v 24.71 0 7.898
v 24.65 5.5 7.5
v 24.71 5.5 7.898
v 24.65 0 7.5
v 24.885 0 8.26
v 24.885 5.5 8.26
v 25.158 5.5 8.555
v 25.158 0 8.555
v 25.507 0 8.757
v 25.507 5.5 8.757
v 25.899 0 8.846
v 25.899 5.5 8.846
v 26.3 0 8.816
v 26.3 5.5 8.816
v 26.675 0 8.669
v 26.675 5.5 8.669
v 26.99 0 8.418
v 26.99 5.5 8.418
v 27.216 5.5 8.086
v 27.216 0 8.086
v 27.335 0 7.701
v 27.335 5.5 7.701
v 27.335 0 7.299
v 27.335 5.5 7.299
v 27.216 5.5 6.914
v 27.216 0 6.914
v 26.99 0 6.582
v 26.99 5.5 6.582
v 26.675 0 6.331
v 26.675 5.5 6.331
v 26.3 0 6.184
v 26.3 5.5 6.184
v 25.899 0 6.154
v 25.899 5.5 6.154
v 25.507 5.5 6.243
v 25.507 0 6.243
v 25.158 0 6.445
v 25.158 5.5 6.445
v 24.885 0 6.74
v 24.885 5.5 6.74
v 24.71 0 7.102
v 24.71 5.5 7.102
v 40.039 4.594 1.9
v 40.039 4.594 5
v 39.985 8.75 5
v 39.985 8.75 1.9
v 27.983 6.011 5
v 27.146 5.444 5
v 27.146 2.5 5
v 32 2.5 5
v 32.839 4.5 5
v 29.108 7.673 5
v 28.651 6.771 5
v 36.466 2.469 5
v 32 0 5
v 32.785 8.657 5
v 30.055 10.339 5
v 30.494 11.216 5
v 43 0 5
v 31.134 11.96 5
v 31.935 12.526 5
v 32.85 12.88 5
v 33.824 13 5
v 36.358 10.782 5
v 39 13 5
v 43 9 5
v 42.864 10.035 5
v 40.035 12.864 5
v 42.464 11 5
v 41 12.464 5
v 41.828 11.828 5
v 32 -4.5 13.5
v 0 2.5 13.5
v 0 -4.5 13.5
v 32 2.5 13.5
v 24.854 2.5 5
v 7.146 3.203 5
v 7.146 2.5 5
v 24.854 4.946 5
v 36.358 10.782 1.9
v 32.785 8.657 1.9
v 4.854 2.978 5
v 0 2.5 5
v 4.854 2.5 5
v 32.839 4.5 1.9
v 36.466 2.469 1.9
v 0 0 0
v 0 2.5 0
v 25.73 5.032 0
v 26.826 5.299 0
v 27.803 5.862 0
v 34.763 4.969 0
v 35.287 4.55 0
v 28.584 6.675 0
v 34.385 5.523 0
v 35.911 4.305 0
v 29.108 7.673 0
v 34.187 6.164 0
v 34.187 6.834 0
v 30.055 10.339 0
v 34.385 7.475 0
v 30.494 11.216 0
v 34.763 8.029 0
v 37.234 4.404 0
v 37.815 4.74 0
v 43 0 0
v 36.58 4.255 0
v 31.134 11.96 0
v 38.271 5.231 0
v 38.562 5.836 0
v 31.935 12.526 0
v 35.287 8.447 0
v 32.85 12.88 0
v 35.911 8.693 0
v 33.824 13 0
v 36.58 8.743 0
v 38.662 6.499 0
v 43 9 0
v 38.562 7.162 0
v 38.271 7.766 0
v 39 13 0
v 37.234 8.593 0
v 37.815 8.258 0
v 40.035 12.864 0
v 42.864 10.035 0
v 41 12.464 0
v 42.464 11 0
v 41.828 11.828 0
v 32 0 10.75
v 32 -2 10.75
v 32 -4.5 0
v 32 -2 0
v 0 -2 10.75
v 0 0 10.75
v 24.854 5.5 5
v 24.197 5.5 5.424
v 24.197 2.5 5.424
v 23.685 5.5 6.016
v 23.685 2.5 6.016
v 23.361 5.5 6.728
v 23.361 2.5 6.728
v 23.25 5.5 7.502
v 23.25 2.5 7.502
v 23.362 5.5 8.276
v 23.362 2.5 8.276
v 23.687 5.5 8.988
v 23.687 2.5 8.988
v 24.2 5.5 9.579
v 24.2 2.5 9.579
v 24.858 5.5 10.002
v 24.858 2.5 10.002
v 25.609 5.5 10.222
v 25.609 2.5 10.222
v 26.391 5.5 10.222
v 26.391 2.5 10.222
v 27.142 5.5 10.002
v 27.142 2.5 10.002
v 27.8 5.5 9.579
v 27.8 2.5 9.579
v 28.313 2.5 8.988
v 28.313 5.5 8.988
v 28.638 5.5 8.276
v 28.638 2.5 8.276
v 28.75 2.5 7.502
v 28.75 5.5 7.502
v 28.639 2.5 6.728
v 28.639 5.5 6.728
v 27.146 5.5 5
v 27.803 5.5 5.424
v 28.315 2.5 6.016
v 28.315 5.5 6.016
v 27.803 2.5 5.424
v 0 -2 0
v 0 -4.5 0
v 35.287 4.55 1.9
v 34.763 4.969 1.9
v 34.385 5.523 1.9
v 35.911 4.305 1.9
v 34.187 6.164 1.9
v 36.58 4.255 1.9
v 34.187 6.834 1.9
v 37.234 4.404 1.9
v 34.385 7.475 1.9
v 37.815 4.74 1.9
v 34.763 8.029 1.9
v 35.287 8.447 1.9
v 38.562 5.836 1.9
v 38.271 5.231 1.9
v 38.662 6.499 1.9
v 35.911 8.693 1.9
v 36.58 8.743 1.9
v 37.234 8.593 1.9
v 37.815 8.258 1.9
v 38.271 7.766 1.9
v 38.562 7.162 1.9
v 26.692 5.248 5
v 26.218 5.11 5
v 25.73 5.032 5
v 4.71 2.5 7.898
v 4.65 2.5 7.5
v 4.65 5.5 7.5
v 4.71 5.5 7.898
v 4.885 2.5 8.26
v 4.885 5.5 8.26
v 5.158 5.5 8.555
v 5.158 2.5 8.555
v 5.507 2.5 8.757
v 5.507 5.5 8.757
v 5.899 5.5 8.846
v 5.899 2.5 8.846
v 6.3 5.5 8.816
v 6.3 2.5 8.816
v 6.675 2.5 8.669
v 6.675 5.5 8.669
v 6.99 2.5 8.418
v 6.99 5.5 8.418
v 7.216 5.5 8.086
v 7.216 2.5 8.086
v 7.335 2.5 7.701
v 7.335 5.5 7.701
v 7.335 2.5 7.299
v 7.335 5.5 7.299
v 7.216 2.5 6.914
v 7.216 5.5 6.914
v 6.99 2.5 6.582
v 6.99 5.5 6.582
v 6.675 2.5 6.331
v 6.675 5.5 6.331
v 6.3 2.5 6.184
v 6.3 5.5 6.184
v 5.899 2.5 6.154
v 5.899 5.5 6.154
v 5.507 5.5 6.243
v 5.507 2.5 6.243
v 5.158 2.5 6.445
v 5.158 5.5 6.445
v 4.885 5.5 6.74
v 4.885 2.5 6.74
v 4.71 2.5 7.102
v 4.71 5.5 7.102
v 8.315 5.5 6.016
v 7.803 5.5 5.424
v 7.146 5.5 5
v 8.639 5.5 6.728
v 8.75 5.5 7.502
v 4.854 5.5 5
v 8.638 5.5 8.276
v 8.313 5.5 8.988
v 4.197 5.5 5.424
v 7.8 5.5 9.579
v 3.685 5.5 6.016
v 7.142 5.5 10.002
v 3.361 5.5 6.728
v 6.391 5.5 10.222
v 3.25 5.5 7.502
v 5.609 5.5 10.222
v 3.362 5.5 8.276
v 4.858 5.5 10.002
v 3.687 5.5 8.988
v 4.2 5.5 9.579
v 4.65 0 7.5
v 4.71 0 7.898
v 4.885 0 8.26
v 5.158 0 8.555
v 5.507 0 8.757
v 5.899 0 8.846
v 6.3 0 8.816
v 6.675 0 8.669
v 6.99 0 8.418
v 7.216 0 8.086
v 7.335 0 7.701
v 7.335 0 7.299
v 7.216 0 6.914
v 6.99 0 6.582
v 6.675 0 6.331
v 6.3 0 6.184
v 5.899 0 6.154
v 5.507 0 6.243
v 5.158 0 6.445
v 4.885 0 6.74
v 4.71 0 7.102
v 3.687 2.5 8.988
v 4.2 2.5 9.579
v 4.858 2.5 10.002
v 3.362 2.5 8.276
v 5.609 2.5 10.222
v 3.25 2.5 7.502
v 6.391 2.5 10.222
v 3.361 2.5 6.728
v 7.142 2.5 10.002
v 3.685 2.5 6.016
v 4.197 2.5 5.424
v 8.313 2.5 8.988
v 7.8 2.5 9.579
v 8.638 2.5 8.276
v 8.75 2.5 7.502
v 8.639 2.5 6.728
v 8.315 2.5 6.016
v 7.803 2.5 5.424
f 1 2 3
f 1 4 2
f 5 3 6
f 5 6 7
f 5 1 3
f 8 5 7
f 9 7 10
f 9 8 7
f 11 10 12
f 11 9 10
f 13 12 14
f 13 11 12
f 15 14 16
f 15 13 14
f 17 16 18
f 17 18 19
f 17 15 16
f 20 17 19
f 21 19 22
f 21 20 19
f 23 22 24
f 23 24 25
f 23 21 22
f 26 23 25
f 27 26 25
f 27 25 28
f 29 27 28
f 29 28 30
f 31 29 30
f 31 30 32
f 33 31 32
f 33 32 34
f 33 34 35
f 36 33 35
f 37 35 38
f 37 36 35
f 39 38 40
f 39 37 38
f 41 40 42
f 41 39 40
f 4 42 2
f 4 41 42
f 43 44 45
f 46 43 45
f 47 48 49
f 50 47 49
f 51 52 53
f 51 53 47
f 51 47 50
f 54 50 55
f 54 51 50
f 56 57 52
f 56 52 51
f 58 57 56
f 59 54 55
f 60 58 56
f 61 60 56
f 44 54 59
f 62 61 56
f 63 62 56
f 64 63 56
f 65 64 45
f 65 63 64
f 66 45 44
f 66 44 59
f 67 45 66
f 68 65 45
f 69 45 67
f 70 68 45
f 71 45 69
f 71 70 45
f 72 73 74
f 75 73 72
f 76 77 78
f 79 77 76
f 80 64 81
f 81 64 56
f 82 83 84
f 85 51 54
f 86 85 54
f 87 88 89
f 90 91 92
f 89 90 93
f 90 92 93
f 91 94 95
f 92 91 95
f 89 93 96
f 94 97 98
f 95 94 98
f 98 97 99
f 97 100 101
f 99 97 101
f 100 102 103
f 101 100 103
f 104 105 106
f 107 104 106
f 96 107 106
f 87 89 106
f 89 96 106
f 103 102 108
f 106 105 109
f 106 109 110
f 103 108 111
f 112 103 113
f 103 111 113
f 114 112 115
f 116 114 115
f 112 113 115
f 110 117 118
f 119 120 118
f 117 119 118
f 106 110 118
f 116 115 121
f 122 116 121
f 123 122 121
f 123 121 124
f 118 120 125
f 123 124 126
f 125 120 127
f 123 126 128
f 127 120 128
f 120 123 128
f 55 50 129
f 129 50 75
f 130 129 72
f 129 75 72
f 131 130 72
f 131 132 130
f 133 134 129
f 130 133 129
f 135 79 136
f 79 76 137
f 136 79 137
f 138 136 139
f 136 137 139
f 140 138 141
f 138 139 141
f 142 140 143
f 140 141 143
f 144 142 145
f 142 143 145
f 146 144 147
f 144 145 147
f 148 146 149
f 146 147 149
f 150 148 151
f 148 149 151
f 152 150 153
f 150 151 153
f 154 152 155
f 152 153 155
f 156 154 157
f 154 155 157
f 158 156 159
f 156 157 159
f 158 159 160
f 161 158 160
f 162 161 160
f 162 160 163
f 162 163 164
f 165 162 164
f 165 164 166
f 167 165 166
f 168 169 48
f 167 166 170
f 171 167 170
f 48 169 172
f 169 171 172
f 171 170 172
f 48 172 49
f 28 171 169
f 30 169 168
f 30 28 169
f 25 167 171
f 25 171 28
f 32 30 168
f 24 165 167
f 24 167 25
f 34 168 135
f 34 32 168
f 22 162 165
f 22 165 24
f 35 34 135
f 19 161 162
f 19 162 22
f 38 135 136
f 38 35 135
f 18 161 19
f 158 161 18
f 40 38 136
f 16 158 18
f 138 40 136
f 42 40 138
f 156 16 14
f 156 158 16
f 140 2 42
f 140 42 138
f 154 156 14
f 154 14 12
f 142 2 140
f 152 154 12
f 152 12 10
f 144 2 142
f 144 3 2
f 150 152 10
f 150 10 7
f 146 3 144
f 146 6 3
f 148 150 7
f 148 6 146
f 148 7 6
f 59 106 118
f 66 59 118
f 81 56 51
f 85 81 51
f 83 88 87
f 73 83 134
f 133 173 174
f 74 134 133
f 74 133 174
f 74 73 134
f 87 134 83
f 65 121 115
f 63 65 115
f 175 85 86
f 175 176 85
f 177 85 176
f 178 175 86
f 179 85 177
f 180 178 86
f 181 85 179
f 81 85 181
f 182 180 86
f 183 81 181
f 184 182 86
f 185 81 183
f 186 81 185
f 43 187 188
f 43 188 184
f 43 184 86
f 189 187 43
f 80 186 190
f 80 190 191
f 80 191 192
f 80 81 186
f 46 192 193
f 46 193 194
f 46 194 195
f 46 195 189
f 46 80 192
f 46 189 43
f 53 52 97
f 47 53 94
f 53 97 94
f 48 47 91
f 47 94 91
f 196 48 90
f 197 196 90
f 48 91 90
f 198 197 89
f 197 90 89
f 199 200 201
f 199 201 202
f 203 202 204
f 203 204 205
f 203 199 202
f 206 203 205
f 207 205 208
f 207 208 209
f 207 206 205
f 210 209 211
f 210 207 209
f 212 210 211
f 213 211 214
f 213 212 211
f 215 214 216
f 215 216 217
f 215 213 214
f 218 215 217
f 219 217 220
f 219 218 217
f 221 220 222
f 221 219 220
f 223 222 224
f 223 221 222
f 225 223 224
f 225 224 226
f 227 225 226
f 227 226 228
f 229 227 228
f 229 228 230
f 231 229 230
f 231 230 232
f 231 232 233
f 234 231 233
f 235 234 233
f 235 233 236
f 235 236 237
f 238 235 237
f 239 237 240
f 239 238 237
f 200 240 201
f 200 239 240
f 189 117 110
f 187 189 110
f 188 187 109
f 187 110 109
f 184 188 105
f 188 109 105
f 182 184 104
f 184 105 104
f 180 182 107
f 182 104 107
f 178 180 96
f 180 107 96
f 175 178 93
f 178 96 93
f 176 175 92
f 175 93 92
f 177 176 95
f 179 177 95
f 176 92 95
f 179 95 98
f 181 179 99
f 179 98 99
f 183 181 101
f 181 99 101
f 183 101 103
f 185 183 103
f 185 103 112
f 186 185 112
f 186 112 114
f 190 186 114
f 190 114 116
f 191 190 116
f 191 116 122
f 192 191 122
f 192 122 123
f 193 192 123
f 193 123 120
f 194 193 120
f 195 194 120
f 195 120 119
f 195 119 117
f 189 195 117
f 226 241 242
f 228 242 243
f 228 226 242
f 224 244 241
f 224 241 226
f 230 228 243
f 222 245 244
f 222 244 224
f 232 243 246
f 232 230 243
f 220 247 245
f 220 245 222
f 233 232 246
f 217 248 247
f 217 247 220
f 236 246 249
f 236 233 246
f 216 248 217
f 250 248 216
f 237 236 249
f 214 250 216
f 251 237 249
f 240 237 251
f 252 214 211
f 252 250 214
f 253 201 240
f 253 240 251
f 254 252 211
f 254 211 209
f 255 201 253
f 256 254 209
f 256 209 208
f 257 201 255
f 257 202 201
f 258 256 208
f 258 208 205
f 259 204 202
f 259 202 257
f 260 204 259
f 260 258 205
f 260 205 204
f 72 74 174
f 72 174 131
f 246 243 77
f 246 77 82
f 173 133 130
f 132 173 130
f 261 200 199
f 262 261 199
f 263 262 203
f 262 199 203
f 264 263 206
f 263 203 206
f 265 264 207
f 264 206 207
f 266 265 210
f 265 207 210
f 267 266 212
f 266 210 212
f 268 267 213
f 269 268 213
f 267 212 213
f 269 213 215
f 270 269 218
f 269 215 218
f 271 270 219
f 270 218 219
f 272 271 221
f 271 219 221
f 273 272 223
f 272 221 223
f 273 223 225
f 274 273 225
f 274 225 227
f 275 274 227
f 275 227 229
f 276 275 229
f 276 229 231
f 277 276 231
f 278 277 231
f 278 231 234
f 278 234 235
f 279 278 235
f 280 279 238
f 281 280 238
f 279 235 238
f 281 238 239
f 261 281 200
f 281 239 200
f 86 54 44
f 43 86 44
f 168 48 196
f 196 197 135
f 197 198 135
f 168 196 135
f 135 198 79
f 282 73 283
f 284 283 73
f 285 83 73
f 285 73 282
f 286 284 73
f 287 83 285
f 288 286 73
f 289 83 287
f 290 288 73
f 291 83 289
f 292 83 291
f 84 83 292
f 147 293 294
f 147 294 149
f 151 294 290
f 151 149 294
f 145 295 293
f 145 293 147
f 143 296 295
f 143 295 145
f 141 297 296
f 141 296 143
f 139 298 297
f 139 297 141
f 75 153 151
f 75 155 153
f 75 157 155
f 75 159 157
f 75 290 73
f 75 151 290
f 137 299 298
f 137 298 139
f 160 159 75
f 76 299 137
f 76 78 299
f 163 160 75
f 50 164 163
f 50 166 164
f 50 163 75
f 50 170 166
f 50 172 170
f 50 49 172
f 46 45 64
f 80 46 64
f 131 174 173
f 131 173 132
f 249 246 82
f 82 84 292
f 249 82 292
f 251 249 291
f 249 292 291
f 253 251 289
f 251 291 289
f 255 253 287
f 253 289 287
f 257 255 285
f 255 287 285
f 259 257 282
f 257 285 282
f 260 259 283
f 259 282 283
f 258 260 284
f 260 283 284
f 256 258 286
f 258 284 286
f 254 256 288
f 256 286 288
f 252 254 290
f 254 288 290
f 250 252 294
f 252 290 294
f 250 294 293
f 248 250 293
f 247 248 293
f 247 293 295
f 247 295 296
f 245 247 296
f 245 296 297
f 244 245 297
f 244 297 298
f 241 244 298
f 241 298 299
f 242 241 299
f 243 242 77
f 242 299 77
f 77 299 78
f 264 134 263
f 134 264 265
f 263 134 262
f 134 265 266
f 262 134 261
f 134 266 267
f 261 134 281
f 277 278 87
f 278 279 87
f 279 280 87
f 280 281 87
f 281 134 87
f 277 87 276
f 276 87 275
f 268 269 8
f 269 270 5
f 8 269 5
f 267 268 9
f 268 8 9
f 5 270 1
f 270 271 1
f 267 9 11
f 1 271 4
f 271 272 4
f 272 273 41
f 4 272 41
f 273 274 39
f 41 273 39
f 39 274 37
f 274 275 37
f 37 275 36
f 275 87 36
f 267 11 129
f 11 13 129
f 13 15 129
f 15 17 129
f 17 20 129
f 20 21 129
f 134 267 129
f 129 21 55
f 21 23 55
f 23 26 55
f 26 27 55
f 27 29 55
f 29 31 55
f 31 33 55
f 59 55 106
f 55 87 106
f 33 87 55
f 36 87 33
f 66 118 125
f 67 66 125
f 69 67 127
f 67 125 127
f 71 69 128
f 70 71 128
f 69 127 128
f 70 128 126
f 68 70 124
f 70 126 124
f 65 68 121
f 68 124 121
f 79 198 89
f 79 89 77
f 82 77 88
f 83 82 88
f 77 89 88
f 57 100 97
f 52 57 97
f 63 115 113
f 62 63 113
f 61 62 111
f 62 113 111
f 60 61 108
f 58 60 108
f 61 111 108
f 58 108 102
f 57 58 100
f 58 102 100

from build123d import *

# Parameters (mm, degrees)
F1_DEPTH  = 5
F3_DEPTH  = 3.1
F4_R      = 2.25
F5_DEPTH  = 5.001
F6_W      = 32
F6_H      = 2.5
F7_DEPTH  = 8.5
F8_W      = 32
F8_H      = 2.75
F9_DEPTH  = 4.5
F10_W     = 32
F10_H     = 2.5
F11_DEPTH = 10.75
F12_R     = 1.35
F13_DEPTH = 3
F14_DEPTH = 2.5


# Not quite as in the source:
# - a feature names something its author has since deleted; it is built from what else it names


with BuildPart() as f1:
    # F0 (on Top) → F1 (new body)
    with BuildSketch(Plane.XY):
        with BuildLine():
            Line((0, 2.5), (0, 0))
            Line((0, 0), (43, 0))
            Line((43, 0), (43, 9))
            ThreePointArc((43, 9), (41.8284271247, 11.8284271247), (39, 13))
            Line((39, 13), (33.8239016482, 13))
            ThreePointArc((33.8239016482, 13), (31.5169659003, 12.2677281794), (30.0546821723, 10.3390237274))
            Line((30.0546821723, 10.3390237274), (29.1077482568, 7.6734983272))
            ThreePointArc((29.1077482568, 7.6734983272), (27.8028764103, 5.8618093159), (25.7302204856, 5.0317460488))
            Line((25.7302204856, 5.0317460488), (0, 2.5))
        make_face()
    extrude(amount=F1_DEPTH)

    # F2 (on face) → F3 (cut)
    with BuildSketch(Plane.XY.offset(5)):
        Polygon((39.9846022951, 8.7502746915), (36.3578632635, 10.7817185123), (32.7852117926, 8.6565922885), (32.8392993532, 4.5000222439), (36.4660383847, 2.4685784231), (40.0386898557, 4.5937046469), align=None)
    extrude(amount=-F3_DEPTH, mode=Mode.SUBTRACT)

    # F4 (on face) → F5 (cut, through all)
    with BuildSketch(Plane(origin=(0, 0, 0), x_dir=(1, 0, 0), z_dir=(0, 0, -1))):
        with Locations((36.4119508241, -6.4989285606)):
            Circle(F4_R)
    extrude(amount=-F5_DEPTH, mode=Mode.SUBTRACT)

    # F6 (on face) → F7 (join)
    with BuildSketch(Plane.XY.offset(5)):
        with Locations((16, 1.25)):
            Rectangle(F6_W, F6_H)
    extrude(amount=F7_DEPTH)

    # F8 (on face) → F9 (join)
    with BuildSketch(Plane.XZ):
        with Locations((16, 12.125)):
            Rectangle(F8_W, F8_H)
    extrude(amount=F9_DEPTH)

    # F10 (on face) → F11 (join)
    with BuildSketch(Plane(origin=(0, 0, 10.75), x_dir=(1, 0, 0), z_dir=(0, 0, -1))):
        with Locations((16, 3.25)):
            Rectangle(F10_W, F10_H)
    extrude(amount=F11_DEPTH)

    # F12 (on face) → F13 (join)
    with BuildSketch(Plane(origin=(0, 2.5, 0), x_dir=(-1, 0, 0), z_dir=(0, 1, 0))):
        with BuildLine():
            Line((-27.1456439237, 5), (-24.8543560763, 5))
            ThreePointArc((-24.8543560763, 5), (-26, 10.25), (-27.1456439237, 5))
        make_face()
        with Locations((-26, 7.5)):
            Circle(F12_R, mode=Mode.SUBTRACT)
        with BuildLine():
            Line((-7.1456439237, 5), (-4.8543560763, 5))
            ThreePointArc((-4.8543560763, 5), (-6, 10.25), (-7.1456439237, 5))
        make_face()
        with Locations((-6, 7.5)):
            Circle(F12_R, mode=Mode.SUBTRACT)
    extrude(amount=F13_DEPTH)

    # F14 (cut, through all): faces of the model
    f14_faces = [f1.faces().sort_by_distance(p)[0] for p in [
        (6, 2.5, 7.5),
        (26, 2.5, 7.5),
    ]]
    extrude(f14_faces, amount=-F14_DEPTH, mode=Mode.SUBTRACT)


solid = f1.part
